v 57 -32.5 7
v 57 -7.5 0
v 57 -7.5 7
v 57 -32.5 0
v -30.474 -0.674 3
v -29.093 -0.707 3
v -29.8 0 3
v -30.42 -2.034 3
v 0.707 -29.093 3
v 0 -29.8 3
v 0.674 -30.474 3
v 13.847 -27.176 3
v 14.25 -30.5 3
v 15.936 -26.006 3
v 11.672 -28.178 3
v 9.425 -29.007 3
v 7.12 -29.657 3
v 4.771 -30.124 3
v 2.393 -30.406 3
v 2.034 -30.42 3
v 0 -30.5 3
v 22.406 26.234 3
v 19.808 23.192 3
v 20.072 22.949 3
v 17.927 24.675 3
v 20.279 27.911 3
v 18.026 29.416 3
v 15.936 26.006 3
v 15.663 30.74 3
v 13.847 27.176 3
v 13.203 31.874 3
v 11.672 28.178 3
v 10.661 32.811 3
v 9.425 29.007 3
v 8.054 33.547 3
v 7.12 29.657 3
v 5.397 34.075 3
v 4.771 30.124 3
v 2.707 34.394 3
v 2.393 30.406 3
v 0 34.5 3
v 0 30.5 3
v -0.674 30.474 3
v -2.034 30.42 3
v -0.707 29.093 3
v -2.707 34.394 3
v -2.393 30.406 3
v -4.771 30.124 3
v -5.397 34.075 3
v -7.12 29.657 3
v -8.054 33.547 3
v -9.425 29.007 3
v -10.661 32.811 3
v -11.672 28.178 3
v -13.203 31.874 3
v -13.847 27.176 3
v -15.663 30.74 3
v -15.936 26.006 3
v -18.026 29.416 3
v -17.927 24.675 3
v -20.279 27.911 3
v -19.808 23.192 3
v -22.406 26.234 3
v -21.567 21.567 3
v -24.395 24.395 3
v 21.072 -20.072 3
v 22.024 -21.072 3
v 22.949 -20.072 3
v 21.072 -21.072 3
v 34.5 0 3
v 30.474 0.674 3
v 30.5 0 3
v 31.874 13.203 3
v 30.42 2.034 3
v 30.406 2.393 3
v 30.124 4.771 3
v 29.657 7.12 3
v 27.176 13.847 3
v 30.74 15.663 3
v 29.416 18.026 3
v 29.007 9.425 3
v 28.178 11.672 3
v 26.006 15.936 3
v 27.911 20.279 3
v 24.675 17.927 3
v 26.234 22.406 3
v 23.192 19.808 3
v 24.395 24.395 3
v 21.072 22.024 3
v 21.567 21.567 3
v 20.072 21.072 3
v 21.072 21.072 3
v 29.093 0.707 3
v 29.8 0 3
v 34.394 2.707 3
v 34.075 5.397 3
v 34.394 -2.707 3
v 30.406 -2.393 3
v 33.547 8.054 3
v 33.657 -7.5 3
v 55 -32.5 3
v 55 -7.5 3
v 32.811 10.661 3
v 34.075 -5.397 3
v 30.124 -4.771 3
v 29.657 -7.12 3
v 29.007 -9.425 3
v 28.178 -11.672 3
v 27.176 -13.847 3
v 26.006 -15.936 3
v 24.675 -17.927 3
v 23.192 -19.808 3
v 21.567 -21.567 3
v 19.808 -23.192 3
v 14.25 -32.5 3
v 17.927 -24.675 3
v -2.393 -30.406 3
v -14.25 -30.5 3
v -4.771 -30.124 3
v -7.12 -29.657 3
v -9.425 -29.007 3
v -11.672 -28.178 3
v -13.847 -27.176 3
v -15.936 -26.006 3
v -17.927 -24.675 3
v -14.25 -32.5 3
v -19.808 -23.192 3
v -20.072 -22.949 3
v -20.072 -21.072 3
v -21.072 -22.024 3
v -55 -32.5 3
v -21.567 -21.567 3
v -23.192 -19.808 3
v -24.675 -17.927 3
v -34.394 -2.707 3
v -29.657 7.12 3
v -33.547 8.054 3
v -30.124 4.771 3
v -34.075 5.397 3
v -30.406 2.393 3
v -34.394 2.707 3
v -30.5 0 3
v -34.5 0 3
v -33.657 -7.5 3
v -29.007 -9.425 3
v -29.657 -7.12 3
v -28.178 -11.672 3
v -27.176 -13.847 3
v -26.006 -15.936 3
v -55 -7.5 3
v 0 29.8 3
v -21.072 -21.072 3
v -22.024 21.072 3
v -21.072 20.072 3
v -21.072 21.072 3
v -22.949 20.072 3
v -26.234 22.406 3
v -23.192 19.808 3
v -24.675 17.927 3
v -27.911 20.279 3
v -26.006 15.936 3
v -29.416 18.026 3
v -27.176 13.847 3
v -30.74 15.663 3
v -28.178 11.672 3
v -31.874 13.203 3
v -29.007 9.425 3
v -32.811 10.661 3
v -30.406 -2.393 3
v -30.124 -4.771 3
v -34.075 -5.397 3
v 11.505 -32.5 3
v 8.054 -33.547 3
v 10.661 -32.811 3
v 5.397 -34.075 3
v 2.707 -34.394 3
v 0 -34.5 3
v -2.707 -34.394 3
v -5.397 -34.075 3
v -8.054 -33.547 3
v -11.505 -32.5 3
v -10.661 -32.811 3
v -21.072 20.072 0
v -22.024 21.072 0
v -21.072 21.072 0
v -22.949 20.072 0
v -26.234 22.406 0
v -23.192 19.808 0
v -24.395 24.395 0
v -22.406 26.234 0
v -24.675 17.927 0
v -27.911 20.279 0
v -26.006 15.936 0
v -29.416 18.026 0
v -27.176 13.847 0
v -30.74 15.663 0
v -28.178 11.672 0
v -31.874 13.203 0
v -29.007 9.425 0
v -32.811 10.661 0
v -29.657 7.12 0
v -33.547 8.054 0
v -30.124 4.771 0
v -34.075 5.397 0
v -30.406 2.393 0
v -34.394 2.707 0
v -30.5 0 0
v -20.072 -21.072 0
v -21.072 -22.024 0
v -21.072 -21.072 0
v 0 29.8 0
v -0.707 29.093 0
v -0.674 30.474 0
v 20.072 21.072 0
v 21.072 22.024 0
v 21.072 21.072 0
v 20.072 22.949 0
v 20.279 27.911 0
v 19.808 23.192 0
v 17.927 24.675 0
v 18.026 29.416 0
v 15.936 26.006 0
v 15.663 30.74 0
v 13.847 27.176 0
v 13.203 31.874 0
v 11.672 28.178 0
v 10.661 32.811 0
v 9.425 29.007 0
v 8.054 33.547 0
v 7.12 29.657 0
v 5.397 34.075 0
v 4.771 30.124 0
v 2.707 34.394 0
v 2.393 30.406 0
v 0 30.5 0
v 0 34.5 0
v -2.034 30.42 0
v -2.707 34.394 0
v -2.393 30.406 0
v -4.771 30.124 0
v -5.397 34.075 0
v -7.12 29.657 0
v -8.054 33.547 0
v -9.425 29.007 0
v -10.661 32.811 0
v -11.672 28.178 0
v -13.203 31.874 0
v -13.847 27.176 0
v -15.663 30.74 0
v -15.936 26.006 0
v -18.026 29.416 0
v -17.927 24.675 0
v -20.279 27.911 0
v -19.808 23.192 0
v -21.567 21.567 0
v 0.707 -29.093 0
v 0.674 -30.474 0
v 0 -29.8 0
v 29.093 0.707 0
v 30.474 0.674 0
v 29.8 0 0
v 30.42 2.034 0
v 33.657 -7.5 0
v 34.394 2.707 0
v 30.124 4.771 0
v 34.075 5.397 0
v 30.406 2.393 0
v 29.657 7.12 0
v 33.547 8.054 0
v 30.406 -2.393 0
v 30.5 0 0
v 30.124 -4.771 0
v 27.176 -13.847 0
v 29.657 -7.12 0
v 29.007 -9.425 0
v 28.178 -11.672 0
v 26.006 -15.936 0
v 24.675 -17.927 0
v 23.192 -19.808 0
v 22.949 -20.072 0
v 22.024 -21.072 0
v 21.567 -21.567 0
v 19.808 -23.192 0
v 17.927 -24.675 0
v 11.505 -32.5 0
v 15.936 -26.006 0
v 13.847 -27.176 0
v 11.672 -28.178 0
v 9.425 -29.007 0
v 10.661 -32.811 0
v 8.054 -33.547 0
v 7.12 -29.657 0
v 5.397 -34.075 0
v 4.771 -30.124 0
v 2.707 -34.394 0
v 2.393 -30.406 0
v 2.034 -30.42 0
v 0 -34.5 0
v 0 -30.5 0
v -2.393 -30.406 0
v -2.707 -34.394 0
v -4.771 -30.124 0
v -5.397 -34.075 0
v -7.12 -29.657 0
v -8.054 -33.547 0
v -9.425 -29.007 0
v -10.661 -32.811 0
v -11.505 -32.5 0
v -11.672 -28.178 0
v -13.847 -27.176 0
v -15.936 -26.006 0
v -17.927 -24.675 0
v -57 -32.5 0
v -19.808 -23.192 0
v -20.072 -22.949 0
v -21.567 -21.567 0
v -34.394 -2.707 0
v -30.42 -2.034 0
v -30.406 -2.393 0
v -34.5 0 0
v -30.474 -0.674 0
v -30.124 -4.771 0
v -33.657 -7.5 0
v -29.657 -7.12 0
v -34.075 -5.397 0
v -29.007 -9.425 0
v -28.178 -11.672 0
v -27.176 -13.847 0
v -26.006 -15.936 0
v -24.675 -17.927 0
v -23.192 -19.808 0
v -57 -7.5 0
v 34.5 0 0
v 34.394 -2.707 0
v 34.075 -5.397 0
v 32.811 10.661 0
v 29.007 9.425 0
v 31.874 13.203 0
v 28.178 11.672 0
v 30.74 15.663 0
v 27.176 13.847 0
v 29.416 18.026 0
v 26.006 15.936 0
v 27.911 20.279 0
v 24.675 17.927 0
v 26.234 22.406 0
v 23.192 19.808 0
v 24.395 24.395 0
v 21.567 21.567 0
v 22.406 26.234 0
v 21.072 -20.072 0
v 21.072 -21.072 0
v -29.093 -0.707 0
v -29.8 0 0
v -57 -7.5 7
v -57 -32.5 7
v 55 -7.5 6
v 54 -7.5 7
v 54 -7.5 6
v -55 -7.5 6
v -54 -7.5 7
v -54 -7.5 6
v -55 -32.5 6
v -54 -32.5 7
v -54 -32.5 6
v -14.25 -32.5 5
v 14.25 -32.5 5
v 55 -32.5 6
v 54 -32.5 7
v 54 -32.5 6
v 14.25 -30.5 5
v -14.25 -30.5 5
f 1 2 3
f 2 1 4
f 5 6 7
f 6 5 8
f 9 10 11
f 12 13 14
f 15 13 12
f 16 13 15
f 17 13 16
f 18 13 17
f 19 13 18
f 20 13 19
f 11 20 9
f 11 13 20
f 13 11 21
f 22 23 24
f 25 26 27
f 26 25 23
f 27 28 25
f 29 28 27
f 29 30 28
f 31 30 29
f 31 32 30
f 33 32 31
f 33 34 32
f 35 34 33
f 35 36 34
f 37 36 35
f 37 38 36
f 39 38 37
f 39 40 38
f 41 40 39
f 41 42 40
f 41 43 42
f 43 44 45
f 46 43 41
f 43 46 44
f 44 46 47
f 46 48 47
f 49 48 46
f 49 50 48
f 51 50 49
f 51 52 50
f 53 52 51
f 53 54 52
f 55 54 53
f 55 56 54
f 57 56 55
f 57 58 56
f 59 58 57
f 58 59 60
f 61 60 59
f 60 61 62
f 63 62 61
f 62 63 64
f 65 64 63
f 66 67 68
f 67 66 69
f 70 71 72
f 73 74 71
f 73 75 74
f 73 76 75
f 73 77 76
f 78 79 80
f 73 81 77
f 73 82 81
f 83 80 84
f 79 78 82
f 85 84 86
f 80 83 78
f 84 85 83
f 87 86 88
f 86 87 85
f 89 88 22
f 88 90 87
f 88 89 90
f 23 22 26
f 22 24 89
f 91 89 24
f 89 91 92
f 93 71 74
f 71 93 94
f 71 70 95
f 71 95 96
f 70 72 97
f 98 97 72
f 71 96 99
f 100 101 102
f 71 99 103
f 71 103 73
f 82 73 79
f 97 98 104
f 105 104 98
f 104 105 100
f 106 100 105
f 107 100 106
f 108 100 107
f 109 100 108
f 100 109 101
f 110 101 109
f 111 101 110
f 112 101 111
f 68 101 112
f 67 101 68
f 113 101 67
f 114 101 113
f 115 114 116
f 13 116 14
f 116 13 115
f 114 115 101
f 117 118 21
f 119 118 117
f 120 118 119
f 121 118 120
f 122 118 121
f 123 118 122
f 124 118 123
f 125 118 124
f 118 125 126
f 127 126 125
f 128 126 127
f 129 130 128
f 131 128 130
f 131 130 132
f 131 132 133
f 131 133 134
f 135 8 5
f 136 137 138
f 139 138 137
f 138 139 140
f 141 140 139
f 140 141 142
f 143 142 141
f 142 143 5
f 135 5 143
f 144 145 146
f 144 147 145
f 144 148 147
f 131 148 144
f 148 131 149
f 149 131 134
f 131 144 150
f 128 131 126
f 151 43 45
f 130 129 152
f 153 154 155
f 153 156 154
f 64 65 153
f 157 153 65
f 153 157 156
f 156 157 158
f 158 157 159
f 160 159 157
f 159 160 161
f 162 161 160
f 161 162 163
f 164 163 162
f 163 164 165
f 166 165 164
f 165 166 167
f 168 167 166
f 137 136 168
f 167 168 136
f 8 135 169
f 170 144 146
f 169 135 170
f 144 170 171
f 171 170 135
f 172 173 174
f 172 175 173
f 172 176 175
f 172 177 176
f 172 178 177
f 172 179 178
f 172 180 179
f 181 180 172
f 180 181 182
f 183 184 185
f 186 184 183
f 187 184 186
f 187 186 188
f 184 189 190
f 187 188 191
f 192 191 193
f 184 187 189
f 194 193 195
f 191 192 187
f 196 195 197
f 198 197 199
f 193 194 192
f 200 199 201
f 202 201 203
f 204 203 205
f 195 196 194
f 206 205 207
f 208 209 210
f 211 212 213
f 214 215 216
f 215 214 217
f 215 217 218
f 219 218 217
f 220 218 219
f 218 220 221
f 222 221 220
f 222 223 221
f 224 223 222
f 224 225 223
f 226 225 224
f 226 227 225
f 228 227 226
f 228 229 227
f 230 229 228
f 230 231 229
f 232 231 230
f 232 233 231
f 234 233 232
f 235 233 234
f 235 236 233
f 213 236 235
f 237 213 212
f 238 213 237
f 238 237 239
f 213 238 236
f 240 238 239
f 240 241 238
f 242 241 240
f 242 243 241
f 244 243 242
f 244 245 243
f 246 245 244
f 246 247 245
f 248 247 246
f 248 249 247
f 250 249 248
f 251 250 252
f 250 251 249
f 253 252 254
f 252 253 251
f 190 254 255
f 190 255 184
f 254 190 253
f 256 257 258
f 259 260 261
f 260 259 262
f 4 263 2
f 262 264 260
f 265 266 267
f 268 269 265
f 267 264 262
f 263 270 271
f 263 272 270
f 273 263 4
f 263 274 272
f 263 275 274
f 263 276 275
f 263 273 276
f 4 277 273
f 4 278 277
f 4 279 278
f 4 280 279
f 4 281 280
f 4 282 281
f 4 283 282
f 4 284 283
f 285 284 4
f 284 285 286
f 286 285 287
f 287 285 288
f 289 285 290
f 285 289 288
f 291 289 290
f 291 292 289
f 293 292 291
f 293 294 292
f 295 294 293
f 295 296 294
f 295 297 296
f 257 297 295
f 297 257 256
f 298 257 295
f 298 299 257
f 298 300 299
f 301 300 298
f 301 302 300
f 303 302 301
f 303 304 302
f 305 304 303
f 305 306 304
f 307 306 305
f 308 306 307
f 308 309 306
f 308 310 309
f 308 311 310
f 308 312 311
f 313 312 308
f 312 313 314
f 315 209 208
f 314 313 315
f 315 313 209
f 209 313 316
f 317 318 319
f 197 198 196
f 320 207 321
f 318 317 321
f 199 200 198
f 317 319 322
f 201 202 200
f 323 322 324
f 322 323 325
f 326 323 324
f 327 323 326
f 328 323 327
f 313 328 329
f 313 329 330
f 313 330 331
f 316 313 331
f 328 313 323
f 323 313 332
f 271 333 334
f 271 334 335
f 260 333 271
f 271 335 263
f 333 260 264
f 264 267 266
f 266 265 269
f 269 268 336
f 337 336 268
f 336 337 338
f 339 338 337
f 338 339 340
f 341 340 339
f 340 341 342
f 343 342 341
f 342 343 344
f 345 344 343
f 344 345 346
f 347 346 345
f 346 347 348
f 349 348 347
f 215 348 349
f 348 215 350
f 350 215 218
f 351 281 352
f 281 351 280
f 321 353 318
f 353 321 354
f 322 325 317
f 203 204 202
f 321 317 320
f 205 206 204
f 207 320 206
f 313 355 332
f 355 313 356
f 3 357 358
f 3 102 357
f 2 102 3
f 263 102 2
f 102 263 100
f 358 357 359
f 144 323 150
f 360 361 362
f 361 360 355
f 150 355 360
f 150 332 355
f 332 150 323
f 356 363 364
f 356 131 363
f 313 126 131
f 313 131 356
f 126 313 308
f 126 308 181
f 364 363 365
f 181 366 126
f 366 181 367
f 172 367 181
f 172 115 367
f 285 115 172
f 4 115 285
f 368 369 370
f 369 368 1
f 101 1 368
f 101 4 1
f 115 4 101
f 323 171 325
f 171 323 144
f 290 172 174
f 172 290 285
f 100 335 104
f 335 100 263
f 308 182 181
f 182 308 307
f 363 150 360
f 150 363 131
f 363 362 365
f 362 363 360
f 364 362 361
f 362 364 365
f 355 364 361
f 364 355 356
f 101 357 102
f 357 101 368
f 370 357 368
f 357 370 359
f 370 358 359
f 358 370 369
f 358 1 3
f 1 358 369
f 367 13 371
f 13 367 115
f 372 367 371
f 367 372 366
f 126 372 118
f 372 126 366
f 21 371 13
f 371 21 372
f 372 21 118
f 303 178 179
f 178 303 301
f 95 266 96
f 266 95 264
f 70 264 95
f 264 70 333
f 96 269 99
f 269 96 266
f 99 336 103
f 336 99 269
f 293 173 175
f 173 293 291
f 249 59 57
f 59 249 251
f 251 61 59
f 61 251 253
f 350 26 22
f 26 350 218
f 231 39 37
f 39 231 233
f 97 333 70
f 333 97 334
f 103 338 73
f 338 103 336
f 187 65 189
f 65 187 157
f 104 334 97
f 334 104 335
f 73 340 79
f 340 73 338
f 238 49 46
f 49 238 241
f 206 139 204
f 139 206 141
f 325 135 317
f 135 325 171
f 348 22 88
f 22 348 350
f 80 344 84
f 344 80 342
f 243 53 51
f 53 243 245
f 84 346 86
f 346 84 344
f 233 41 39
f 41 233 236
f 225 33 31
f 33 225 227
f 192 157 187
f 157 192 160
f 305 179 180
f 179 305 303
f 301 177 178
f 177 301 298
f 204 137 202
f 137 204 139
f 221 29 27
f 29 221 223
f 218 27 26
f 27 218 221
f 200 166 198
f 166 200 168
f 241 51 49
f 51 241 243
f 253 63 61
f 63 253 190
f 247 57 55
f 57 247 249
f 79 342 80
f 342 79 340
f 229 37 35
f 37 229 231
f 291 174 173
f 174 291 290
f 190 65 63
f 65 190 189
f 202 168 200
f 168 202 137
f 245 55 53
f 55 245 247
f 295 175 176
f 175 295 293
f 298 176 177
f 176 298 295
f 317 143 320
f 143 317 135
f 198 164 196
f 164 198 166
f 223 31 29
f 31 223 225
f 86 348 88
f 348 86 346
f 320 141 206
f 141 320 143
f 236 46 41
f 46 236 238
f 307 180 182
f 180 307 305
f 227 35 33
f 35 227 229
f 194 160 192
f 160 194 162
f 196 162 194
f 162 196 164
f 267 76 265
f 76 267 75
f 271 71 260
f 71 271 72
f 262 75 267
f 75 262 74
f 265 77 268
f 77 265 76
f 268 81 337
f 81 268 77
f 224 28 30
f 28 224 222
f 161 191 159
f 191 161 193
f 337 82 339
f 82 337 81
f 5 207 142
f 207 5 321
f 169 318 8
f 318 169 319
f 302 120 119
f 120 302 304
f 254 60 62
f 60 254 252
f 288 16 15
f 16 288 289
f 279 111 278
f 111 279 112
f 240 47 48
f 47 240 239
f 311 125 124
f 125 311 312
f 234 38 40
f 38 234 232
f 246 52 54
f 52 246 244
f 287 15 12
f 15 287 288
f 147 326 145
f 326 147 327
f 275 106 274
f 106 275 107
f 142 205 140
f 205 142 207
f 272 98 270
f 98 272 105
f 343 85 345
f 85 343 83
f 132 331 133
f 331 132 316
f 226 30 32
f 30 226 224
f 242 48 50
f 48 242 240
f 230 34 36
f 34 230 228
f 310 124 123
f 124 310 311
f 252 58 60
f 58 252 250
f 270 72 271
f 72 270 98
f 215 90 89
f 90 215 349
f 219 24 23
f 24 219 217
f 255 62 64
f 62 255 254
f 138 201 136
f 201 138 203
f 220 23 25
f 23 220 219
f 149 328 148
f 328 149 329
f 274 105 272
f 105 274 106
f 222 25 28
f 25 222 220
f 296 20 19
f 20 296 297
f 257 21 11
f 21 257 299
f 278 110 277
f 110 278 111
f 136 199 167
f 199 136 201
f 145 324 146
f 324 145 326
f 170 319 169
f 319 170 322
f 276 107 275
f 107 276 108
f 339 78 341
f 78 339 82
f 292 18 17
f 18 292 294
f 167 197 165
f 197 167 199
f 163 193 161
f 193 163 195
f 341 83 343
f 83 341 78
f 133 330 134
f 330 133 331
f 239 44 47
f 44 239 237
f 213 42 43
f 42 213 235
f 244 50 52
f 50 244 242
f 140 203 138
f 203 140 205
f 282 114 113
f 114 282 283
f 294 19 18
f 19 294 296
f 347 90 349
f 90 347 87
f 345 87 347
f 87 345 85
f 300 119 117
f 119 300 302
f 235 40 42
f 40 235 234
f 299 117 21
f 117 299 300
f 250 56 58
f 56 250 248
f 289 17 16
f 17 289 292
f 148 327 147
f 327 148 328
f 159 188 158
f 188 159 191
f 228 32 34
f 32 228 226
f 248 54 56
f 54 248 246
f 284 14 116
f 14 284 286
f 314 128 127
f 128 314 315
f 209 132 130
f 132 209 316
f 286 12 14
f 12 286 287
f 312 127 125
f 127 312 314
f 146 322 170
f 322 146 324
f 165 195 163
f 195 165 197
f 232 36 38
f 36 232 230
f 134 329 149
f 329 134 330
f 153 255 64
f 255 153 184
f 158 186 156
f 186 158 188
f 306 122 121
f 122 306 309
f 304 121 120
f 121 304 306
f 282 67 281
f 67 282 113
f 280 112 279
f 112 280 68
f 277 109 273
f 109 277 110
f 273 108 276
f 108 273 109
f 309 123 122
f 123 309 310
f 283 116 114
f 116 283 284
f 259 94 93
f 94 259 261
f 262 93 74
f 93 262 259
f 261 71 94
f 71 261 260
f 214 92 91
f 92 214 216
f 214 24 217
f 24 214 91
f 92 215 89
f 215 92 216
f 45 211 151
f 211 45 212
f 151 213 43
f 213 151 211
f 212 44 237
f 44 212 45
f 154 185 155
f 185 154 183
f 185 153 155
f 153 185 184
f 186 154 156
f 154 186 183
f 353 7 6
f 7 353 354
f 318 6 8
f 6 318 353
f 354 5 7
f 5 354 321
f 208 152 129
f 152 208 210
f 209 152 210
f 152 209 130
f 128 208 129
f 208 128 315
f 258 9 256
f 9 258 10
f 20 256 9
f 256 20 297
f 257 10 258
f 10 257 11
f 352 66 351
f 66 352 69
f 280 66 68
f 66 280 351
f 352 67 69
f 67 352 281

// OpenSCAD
$fn=80;

//inner radius
ir = 30.5;
//outer radius
or = 34.5;


w = 110+4;
h = 25;

th=3;

module ring()
{

difference()
{
cylinder(r=or, h=th);

cylinder(r=ir, h=th);
}


//flörps


for(i=[0:7])
{
rotate([0,0,i*45])
translate([ir-.7,0,0])
rotate([0,0,45])
cube([3,1,th]);

}


}

module holder()
{

difference()
{
translate([-w/2,-ir-2,0])
cube([w,h,th]);
cylinder(r=or,h=th);
}


//drop stop
translate([-w/8,-ir-2,th])
cube([w/4,2,2]);

//side holder
module side()
{
translate([-w/2,-ir-2,th])
cube([2,h,3]);

translate([-w/2,-ir-2,th+3])
cube([3,h,1]);

}

side();

mirror([1,0,0])
side();
}

holder();

ring();
